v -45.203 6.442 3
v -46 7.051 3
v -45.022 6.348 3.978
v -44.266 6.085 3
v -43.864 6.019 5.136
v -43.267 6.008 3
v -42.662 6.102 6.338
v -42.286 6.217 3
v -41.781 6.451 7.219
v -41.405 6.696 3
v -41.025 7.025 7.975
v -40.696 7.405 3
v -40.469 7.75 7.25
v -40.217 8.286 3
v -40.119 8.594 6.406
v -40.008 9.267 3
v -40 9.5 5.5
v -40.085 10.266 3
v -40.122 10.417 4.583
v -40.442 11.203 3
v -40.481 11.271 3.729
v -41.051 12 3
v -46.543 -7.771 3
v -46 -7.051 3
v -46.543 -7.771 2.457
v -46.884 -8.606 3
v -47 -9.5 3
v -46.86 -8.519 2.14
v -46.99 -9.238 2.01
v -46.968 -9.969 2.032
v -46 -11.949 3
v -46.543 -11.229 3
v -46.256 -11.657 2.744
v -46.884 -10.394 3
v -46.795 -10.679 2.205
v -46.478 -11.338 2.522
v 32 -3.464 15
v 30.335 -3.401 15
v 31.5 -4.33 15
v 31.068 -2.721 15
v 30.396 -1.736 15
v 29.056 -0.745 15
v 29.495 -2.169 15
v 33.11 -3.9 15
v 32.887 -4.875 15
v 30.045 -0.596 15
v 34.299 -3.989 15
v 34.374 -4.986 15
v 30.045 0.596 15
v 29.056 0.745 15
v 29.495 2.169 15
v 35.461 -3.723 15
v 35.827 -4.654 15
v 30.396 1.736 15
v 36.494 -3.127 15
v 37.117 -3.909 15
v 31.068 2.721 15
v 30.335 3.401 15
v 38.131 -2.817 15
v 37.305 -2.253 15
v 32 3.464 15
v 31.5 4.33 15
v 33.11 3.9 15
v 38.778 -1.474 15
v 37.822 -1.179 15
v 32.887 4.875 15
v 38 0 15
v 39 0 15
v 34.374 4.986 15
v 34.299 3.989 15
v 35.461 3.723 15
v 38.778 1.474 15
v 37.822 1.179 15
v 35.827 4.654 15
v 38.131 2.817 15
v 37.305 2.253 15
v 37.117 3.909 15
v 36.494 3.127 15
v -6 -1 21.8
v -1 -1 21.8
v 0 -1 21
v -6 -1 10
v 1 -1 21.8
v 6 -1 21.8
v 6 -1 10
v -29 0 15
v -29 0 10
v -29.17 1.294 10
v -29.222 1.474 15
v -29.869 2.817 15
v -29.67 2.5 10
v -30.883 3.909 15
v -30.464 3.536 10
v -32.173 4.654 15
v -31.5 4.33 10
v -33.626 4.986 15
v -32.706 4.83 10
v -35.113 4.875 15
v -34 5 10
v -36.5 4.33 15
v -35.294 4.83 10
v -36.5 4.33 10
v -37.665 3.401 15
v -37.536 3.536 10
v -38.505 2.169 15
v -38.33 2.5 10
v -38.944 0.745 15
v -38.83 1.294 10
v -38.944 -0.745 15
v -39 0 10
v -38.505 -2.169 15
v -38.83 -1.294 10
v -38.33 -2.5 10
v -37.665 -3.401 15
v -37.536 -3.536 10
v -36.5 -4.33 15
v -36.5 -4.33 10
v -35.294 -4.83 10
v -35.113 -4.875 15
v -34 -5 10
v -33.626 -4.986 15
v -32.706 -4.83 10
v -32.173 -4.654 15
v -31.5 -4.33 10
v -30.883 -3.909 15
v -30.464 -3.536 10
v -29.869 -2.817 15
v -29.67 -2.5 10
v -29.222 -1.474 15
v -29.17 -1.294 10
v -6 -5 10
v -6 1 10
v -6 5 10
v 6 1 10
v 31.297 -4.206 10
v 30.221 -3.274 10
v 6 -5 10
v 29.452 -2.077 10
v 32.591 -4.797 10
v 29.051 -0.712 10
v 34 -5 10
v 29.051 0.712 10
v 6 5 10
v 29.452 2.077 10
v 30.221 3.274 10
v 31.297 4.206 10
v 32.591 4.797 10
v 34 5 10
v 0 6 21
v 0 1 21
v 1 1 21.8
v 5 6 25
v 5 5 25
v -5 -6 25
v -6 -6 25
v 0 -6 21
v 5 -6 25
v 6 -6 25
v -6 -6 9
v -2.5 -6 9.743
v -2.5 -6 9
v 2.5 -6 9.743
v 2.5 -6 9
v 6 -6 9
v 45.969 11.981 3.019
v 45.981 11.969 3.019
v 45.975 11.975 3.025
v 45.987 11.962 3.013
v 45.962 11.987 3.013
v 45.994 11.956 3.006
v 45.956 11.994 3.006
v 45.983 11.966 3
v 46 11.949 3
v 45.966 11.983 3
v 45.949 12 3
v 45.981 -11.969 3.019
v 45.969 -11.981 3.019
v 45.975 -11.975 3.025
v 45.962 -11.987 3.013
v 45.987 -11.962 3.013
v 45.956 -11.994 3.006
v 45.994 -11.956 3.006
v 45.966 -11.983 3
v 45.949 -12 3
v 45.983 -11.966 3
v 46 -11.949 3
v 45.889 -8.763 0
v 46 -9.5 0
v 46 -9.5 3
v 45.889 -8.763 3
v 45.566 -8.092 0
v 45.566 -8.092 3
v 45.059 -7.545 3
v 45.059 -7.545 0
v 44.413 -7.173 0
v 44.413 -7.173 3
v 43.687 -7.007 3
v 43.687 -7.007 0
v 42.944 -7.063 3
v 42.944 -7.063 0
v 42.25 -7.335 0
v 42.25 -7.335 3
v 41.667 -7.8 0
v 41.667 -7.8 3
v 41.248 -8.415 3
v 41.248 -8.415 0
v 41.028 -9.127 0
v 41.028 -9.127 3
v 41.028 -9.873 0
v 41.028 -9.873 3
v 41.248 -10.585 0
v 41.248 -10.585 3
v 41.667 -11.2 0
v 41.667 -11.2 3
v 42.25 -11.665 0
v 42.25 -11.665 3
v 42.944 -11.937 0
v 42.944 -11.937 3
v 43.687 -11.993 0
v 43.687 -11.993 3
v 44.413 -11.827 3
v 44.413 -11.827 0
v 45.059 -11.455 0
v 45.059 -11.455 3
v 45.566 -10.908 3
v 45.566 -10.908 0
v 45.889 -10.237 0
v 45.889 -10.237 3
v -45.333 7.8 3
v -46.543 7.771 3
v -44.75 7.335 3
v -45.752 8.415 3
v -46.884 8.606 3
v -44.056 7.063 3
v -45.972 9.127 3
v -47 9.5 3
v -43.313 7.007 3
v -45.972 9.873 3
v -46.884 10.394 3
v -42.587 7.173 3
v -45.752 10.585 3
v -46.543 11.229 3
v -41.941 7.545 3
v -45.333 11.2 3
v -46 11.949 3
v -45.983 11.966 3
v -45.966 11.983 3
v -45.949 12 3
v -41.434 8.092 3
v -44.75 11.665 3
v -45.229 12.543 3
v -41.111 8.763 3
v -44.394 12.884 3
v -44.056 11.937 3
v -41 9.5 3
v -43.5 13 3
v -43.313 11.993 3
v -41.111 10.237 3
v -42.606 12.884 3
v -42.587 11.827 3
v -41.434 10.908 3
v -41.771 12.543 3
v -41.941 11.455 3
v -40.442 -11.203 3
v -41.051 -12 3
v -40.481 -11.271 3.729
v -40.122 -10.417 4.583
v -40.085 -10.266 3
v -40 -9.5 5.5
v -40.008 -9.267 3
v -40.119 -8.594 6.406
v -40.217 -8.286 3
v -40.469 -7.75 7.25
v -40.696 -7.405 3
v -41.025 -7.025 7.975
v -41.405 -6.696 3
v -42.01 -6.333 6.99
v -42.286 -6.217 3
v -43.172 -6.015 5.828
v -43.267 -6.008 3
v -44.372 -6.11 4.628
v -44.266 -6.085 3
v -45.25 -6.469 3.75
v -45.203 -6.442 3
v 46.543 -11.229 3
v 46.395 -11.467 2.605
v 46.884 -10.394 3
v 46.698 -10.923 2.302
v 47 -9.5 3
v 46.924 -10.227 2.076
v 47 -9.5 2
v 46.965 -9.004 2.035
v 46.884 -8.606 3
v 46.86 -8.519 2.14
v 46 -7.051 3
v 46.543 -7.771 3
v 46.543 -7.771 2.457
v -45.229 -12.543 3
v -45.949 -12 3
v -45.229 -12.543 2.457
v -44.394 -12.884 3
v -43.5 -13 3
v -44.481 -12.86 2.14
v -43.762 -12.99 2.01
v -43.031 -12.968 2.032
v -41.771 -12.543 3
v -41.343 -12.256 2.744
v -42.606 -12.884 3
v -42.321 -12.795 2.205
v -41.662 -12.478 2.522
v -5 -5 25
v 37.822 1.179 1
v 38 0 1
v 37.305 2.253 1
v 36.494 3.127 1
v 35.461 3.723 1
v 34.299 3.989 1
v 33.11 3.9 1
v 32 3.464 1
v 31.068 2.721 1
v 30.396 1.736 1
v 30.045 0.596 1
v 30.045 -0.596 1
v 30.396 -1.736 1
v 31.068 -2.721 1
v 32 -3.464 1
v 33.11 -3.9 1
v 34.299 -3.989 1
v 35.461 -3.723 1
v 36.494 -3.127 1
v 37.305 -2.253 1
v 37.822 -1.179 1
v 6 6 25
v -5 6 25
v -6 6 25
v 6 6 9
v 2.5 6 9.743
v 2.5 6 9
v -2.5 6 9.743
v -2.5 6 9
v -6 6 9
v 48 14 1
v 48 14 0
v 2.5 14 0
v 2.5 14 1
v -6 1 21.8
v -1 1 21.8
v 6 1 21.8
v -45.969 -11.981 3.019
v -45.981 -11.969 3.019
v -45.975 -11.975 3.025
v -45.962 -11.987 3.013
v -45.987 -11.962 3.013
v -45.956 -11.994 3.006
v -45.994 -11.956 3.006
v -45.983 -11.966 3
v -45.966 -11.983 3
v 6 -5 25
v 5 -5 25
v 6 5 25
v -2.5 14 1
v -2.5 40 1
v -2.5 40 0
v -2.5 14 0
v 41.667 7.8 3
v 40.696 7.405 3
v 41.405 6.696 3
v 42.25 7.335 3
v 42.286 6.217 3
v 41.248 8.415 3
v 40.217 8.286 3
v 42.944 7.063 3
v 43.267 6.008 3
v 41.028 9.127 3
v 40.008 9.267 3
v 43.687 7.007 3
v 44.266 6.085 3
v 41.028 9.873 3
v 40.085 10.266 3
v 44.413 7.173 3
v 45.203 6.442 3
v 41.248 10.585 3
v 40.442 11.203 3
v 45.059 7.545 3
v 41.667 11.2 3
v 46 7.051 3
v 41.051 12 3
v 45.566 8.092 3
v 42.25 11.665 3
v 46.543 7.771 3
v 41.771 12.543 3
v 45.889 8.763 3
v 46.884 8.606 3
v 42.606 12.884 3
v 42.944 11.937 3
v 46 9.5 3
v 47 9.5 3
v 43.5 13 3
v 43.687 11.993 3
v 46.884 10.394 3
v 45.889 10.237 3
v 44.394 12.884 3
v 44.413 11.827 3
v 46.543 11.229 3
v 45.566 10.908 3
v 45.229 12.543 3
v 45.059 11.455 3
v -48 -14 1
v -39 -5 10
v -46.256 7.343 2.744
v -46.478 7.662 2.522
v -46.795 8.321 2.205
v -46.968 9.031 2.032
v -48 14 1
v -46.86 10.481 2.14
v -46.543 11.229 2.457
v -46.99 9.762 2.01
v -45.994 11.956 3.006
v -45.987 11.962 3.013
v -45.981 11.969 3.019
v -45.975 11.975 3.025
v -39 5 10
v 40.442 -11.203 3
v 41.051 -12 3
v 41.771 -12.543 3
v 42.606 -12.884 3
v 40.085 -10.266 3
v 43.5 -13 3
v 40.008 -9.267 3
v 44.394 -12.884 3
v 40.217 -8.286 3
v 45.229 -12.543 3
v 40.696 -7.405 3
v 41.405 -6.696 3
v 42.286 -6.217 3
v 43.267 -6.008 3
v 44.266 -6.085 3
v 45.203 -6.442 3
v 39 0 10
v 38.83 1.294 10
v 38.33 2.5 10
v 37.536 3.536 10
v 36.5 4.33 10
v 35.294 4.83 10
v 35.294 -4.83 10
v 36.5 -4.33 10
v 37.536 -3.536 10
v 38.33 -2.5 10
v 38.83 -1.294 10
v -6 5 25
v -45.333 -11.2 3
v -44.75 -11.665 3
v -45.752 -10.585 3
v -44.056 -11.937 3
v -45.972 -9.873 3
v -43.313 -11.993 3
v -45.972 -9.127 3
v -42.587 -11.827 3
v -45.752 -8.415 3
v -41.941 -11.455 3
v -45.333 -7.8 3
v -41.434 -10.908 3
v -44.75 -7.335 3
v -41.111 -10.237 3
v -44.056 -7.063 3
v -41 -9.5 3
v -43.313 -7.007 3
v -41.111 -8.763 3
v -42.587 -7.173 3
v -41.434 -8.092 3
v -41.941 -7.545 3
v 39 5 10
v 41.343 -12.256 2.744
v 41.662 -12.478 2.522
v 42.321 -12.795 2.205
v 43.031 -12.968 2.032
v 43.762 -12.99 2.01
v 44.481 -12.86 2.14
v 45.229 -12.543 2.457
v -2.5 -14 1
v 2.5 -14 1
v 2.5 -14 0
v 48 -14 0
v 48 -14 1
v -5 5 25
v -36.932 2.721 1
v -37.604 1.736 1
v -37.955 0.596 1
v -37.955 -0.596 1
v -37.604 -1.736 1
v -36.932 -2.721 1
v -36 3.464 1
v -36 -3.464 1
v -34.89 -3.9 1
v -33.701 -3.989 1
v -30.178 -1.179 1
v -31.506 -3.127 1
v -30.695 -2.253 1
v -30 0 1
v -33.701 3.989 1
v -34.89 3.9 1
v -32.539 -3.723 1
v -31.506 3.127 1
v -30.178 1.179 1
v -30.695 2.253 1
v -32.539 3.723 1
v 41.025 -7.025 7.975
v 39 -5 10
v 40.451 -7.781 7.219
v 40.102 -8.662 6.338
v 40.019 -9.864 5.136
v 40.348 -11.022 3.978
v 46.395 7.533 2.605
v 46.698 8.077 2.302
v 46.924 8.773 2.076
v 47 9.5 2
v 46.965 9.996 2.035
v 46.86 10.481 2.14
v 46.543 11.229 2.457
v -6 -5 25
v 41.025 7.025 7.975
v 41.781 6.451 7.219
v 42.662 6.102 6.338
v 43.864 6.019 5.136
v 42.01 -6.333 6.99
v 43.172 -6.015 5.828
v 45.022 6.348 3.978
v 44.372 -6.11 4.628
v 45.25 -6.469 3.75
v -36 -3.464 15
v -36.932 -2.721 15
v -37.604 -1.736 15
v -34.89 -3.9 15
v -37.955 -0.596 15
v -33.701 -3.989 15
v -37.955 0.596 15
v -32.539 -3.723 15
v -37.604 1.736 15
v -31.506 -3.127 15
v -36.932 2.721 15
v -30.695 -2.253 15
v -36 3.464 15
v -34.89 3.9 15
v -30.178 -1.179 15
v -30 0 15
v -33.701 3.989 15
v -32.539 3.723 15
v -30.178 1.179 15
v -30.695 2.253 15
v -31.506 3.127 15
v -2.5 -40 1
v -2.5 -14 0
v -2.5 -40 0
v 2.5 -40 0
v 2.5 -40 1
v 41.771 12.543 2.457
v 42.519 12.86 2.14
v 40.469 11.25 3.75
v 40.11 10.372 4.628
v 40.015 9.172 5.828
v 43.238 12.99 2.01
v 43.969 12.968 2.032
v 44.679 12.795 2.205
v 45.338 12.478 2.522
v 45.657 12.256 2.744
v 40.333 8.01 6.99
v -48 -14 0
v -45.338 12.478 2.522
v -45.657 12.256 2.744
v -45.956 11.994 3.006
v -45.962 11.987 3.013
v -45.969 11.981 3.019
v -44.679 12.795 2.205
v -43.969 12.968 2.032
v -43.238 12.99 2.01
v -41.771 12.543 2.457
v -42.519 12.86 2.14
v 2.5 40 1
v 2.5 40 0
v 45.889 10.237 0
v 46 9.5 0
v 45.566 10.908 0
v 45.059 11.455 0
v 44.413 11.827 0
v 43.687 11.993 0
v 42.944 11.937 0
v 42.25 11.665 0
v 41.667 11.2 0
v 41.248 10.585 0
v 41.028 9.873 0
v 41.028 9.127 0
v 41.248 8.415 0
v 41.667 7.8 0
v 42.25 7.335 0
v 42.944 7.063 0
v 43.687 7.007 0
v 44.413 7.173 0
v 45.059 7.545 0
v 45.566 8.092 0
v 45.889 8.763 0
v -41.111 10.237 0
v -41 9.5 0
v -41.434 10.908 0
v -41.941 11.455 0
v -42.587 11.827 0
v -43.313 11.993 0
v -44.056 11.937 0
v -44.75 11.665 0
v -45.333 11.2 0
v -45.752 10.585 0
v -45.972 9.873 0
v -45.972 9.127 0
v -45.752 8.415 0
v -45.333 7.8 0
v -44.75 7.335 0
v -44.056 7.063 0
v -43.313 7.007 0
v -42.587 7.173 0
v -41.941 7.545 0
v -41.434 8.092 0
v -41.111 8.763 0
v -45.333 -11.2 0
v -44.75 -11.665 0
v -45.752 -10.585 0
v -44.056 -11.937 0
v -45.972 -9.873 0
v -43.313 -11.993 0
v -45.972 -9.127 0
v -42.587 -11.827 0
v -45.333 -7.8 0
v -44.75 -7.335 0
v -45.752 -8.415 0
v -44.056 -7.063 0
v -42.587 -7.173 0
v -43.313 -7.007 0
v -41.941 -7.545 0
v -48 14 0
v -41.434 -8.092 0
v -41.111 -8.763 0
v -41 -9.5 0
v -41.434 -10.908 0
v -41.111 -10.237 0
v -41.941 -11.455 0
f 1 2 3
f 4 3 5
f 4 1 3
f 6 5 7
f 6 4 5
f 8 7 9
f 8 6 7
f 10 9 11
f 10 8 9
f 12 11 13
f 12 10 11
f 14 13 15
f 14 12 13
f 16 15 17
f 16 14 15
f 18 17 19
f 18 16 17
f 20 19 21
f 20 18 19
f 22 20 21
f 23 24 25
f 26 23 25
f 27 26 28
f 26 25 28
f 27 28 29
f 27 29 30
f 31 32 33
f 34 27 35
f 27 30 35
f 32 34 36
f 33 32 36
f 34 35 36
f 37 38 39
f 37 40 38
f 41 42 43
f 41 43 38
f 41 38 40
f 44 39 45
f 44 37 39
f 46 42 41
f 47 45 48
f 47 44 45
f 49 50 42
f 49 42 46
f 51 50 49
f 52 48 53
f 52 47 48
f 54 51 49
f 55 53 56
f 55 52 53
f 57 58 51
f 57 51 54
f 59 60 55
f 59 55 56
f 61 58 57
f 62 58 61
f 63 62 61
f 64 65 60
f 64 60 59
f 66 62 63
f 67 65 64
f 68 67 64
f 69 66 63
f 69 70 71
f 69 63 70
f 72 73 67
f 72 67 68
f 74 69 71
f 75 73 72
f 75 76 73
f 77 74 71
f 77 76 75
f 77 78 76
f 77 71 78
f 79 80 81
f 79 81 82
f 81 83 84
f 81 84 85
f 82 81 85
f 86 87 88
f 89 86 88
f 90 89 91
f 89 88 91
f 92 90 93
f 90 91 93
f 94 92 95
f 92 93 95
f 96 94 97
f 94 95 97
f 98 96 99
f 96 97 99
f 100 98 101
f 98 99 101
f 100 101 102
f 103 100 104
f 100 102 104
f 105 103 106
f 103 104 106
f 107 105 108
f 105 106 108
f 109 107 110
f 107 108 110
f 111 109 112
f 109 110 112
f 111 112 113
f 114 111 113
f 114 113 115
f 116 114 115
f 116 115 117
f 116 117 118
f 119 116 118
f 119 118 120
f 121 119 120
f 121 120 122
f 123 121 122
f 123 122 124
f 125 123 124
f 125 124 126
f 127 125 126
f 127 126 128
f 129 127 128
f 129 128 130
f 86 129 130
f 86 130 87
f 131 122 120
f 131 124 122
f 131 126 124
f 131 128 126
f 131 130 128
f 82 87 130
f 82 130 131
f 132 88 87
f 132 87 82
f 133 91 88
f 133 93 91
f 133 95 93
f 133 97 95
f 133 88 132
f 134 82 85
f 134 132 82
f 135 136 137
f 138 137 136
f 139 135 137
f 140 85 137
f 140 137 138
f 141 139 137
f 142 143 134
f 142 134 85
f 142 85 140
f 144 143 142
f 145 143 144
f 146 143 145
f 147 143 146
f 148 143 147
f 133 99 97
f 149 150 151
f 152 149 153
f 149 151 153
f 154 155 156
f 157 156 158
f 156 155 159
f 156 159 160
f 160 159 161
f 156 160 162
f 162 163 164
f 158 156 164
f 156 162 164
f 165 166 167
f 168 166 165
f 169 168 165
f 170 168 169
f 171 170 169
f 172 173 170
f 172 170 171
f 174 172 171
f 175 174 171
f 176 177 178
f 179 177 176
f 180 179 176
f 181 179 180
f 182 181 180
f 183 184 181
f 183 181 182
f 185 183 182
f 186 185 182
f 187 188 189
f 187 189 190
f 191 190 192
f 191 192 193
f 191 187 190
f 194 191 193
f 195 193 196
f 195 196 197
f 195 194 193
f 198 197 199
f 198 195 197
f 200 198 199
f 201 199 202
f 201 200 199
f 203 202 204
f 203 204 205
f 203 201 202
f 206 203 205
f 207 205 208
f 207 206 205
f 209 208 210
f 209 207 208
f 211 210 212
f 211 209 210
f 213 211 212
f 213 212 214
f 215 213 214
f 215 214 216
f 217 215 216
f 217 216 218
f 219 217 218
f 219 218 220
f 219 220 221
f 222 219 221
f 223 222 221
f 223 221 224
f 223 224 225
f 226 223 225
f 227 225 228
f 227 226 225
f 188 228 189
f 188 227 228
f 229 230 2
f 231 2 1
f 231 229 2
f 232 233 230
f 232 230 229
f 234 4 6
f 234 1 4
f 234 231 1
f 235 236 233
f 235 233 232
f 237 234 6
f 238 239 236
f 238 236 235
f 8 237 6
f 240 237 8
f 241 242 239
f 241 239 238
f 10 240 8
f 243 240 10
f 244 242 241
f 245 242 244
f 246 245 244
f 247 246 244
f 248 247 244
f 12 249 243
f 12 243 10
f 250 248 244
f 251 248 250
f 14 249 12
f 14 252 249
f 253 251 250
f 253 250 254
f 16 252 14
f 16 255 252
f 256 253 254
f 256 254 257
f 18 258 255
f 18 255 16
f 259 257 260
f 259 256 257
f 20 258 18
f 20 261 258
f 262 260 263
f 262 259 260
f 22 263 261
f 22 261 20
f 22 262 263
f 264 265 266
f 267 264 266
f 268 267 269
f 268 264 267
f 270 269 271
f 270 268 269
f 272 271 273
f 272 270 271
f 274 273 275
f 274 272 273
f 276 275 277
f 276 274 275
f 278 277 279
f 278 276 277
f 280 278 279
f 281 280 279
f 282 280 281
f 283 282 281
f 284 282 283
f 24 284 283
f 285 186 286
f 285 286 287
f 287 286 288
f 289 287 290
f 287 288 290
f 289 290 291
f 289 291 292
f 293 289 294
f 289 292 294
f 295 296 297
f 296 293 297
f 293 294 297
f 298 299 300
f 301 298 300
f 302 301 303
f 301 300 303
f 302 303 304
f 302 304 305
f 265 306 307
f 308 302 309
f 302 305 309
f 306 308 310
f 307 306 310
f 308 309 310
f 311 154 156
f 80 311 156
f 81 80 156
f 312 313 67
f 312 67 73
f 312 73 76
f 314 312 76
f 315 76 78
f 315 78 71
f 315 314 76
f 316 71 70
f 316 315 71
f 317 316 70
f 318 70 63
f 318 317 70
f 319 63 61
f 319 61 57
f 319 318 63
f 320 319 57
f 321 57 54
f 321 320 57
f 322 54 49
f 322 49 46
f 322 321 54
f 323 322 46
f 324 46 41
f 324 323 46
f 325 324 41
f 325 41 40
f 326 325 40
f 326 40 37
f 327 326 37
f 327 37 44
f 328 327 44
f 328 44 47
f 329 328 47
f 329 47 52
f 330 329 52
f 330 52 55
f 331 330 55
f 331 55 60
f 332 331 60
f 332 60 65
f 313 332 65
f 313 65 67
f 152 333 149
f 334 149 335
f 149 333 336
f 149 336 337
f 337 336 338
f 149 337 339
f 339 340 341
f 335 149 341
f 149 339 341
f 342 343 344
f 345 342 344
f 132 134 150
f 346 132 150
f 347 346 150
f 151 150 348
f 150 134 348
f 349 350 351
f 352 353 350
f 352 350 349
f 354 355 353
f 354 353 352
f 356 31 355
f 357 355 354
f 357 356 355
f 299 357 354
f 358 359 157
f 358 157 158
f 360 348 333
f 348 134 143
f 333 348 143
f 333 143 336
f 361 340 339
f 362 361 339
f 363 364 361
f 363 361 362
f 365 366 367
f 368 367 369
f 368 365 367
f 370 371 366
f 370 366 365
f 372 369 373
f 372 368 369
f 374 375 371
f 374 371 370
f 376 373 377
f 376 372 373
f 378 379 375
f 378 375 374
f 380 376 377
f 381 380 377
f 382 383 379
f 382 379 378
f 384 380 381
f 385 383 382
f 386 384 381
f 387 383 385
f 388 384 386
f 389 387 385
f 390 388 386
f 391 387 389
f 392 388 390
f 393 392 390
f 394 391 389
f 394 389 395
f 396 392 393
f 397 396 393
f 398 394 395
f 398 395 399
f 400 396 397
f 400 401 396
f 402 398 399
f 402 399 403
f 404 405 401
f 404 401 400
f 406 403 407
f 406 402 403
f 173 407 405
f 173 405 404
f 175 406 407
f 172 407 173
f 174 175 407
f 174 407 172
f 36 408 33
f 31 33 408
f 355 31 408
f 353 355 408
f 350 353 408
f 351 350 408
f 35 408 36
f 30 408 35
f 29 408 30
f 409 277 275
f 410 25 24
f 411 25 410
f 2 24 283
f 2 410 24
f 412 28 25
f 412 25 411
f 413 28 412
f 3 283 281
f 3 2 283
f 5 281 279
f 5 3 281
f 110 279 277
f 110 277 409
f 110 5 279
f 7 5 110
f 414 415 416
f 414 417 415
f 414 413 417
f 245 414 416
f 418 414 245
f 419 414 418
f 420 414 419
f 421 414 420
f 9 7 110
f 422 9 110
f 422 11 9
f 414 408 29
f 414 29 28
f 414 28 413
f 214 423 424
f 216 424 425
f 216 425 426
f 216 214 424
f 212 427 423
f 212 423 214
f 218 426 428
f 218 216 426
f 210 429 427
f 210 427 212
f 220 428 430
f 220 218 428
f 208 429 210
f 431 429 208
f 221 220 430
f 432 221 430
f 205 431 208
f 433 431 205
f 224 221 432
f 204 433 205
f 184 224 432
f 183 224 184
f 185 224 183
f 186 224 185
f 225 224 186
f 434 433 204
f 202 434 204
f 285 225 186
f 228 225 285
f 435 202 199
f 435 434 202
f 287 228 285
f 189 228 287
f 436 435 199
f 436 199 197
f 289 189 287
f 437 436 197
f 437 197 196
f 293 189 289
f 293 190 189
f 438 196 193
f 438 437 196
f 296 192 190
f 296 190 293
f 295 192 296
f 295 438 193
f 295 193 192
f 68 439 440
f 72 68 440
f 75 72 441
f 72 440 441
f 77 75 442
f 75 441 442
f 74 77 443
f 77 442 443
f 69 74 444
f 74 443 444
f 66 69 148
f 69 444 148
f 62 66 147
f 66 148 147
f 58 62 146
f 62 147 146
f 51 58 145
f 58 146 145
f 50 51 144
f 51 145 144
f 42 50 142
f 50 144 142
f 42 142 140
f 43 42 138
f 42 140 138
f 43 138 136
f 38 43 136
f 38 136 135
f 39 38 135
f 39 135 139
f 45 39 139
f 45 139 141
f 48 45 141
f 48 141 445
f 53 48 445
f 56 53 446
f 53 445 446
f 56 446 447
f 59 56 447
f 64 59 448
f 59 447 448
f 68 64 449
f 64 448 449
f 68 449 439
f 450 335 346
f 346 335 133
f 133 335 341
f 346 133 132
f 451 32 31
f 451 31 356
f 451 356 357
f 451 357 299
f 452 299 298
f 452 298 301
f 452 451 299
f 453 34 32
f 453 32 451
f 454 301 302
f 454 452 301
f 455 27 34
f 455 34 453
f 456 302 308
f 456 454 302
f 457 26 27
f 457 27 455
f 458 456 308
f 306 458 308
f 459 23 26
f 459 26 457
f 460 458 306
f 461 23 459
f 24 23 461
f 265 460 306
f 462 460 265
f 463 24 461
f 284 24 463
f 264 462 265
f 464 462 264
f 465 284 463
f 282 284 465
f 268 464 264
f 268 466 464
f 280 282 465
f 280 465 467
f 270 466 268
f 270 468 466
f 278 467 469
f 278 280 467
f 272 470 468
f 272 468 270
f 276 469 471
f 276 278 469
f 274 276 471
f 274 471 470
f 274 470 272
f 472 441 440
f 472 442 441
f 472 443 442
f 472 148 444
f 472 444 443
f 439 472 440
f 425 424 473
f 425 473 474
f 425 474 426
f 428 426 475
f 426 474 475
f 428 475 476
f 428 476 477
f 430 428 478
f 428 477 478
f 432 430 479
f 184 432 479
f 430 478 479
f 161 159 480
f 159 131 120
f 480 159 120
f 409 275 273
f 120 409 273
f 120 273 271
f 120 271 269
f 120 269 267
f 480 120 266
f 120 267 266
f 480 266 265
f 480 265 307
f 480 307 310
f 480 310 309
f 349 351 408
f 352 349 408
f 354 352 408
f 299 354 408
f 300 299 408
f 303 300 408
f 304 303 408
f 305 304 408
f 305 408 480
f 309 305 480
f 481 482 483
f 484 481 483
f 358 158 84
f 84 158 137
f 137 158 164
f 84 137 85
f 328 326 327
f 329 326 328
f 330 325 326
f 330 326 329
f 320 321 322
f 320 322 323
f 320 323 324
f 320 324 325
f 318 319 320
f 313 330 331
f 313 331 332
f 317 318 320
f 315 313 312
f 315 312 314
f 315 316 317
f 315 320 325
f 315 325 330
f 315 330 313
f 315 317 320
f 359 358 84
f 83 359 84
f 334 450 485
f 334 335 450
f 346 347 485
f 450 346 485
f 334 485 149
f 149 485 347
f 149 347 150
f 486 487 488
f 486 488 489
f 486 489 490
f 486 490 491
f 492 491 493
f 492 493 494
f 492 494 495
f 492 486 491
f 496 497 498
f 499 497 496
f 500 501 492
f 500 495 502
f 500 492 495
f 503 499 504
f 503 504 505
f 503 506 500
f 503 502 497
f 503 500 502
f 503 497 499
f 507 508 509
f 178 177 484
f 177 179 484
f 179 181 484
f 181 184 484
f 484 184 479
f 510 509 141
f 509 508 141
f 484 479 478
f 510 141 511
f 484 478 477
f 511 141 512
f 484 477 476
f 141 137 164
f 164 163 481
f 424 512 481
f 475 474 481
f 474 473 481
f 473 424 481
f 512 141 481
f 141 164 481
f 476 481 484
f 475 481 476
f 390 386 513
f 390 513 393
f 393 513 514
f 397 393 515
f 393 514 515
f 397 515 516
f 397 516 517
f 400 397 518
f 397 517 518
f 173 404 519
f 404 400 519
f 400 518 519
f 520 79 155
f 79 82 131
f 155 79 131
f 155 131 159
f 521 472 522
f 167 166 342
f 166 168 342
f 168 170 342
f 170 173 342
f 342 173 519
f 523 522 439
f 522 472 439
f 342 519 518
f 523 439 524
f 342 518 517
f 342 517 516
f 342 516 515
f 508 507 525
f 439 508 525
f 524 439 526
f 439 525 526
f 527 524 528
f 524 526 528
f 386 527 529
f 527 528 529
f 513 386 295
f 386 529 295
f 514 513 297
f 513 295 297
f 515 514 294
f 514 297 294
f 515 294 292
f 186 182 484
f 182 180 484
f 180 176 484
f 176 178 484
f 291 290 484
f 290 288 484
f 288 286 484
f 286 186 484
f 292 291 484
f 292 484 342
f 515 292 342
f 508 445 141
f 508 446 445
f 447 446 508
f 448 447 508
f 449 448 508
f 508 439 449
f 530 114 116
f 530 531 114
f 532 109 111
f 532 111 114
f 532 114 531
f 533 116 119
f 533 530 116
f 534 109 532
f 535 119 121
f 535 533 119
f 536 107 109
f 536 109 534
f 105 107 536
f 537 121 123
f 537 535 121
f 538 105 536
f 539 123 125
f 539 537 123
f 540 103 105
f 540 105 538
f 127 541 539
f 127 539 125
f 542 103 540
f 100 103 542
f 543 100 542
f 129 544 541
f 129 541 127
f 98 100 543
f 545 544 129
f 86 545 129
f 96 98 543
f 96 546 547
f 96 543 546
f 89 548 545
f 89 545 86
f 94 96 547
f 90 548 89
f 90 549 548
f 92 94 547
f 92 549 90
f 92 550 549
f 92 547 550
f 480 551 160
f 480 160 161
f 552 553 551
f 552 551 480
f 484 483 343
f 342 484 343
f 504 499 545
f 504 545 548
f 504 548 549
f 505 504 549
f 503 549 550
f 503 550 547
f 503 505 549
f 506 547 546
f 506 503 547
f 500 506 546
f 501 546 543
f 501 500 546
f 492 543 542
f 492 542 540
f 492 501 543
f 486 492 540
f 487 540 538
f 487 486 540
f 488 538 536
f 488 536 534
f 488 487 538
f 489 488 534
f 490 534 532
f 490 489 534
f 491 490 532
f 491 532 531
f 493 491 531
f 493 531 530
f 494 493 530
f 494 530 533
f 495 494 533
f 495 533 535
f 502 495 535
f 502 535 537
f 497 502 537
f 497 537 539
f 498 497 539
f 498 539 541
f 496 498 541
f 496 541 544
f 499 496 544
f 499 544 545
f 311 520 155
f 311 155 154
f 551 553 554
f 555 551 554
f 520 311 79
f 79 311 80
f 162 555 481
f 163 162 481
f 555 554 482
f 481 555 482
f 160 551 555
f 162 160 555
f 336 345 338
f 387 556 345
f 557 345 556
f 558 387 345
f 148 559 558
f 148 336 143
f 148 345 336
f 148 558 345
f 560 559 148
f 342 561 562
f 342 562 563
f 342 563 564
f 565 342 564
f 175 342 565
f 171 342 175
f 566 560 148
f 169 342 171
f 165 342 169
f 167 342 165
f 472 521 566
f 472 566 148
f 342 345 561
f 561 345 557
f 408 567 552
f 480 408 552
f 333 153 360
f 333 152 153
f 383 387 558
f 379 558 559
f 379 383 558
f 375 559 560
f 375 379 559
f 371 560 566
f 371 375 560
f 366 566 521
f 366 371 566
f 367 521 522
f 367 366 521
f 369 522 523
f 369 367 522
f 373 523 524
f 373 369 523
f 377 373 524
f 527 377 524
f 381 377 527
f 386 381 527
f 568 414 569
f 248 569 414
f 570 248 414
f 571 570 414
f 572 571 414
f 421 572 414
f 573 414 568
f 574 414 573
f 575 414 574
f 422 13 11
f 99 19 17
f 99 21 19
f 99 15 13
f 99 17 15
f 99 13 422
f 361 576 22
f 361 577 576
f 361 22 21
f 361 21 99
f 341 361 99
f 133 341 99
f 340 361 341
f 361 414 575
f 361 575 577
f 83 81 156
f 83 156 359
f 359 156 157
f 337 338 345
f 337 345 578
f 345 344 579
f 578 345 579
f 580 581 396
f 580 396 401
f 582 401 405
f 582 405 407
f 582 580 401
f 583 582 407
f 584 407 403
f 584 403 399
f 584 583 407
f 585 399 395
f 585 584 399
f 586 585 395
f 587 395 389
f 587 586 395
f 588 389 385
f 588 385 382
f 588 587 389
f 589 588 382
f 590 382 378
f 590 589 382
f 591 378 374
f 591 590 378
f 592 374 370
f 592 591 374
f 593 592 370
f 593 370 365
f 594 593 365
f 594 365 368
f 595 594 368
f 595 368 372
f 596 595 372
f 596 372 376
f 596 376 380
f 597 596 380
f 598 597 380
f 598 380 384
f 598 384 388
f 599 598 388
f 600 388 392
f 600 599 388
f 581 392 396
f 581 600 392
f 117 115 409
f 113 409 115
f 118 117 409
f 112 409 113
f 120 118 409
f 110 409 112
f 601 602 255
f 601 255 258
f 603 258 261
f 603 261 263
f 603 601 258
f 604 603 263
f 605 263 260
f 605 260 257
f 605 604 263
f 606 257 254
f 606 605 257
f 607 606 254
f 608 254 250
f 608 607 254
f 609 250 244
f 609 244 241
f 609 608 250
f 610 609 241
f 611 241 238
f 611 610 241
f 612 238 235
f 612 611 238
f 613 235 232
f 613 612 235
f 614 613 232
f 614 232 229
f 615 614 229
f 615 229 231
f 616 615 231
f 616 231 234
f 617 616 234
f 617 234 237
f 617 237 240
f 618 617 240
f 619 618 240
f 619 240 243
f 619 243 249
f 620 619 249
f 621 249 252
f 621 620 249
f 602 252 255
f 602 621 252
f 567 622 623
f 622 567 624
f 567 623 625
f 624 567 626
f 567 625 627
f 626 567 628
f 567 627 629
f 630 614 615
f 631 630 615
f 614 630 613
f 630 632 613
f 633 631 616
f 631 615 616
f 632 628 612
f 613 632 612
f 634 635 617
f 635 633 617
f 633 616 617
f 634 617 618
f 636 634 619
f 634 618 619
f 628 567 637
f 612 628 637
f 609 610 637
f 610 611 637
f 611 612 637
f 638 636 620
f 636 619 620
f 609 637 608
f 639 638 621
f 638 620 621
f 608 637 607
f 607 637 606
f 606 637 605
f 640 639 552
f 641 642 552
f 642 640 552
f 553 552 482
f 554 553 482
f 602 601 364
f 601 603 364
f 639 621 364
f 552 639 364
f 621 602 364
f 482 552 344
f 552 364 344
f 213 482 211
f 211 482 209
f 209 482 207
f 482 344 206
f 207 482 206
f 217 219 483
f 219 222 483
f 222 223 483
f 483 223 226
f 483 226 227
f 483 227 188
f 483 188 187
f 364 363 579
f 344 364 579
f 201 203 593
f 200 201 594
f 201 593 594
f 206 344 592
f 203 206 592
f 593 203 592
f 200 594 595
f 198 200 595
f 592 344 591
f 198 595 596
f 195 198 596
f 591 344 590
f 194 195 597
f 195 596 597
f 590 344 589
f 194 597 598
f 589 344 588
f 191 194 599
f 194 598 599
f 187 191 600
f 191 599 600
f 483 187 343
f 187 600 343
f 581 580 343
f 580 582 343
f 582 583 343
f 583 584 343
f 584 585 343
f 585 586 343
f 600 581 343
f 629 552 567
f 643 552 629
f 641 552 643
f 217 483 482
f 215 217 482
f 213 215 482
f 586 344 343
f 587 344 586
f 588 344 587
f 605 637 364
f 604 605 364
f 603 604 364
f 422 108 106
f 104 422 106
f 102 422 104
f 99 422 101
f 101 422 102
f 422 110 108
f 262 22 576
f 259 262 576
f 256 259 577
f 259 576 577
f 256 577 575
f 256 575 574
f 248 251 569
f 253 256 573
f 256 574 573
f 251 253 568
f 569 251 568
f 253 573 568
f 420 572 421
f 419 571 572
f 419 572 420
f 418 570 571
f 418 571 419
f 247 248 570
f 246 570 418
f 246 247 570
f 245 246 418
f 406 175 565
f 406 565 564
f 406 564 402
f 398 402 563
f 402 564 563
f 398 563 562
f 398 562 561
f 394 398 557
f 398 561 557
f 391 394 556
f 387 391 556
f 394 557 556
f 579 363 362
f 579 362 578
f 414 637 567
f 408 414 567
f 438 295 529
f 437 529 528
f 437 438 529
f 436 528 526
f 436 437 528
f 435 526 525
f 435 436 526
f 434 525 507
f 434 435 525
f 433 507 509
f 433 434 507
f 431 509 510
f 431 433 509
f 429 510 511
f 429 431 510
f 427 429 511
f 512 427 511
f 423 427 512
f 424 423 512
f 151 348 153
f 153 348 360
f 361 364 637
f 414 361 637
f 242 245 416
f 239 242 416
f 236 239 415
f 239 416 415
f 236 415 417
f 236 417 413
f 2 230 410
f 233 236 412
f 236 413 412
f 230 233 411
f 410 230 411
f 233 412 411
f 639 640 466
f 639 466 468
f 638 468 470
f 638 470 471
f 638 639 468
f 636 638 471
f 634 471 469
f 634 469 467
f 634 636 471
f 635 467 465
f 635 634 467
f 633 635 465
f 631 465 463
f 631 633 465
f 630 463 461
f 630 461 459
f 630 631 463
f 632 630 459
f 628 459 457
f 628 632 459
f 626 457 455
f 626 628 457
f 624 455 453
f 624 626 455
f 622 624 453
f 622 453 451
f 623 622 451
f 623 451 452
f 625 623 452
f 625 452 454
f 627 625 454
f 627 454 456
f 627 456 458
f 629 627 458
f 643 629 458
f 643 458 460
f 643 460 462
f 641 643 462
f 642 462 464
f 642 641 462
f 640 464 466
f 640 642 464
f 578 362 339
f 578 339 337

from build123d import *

# Parameters (mm, degrees)
F0_R         = 3.5
F0_R_2       = 5
F0_W         = 5
F0_H         = 26
F0_W_2       = 2.5
F0_H_2       = 6
F0_W_3       = 3.5
F1_DEPTH     = 10
F0_R_3       = 4
F2_DEPTH     = 15
F3_DEPTH     = 1
F4_T4_DEPTH  = 74.2902937834
F4_S5_R      = 5
F4_T6_DEPTH  = 39
F4_T10_DEPTH = 74.2902937834
F4_S11_R     = 5
F4_T12_DEPTH = 39
F4_T16_DEPTH = 91.7902937834
F4_T21_DEPTH = 68.6451468917
F4_S22_R     = 5
F4_T23_DEPTH = 36
F4_T27_DEPTH = 68.6451468917
F4_S28_R     = 5
F4_T29_DEPTH = 36
F4_T33_DEPTH = 91.7902937834
F4_T38_DEPTH = 91.7902937834
F4_T43_DEPTH = 68.6451468917
F4_S44_R     = 5
F4_T45_DEPTH = 36
F4_T49_DEPTH = 68.6451468917
F4_S50_R     = 5
F4_T51_DEPTH = 36
F4_T55_DEPTH = 91.7902937834
F5_SIZE2     = 9
F5_SIZE      = 35
F0_R_4       = 2.5
F6_DEPTH     = 3
F7_DEPTH     = 25
F8_W         = 2
F8_H         = 7
F10_DEPTH    = 25
F11_DEPTH    = 25


# Not quite as in the source:
# - a fillet or chamfer that OpenCascade refuses, or shapes differently, is made with other operations: its cross-section is extruded or revolved along the edge and cut away or added


with BuildPart() as f1:
    # F0 (on Top) → F1 (new body)
    with BuildSketch(Plane.XY):
        Polygon((-2.5, 14), (-48, 14), (-48, -14), (-2.5, -14), (-2.5, -6), (-6, -6), (-6, 0), (-6, 6), (-2.5, 6), align=None)
        with Locations((-43.5, -9.5)):
            Circle(F0_R, mode=Mode.SUBTRACT)
        with Locations((-43.5, 9.5)):
            Circle(F0_R, mode=Mode.SUBTRACT)
        with Locations((-34, 0)):
            Circle(F0_R_2, mode=Mode.SUBTRACT)
        Polygon((48, 14), (2.5, 14), (2.5, 6), (6, 6), (6, 0), (6, -6), (2.5, -6), (2.5, -14), (48, -14), align=None)
        with Locations((43.5, -9.5)):
            Circle(F0_R, mode=Mode.SUBTRACT)
        with Locations((34, 0)):
            Circle(F0_R_2, mode=Mode.SUBTRACT)
        with Locations((43.5, 9.5)):
            Circle(F0_R, mode=Mode.SUBTRACT)
        Polygon((-2.5, -6), (-2.5, -14), (2.5, -14), (2.5, -6), (0, -6), align=None)
        with Locations((0, -27)):
            Rectangle(F0_W, F0_H)
        Polygon((2.5, 14), (-2.5, 14), (-2.5, 6), (0, 6), (2.5, 6), align=None)
        with Locations((0, 27)):
            Rectangle(F0_W, F0_H)
        with Locations((1.25, -3)):
            Rectangle(F0_W_2, F0_H_2)
        with Locations((4.25, -3)):
            Rectangle(F0_W_3, F0_H_2)
        with Locations((-4.25, -3)):
            Rectangle(F0_W_3, F0_H_2)
        with Locations((-1.25, -3)):
            Rectangle(F0_W_2, F0_H_2)
        with Locations((-1.25, 3)):
            Rectangle(F0_W_2, F0_H_2)
        with Locations((-4.25, 3)):
            Rectangle(F0_W_3, F0_H_2)
        with Locations((4.25, 3)):
            Rectangle(F0_W_3, F0_H_2)
        with Locations((1.25, 3)):
            Rectangle(F0_W_2, F0_H_2)
    extrude(amount=F1_DEPTH)

    # F0 (on Top) → F2 (join)
    with BuildSketch(Plane.XY):
        with Locations((-34, 0)):
            Circle(F0_R_2)
        with Locations((-34, 0)):
            Circle(F0_R_3, mode=Mode.SUBTRACT)
        with Locations((34, 0)):
            Circle(F0_R_2)
        with Locations((34, 0)):
            Circle(F0_R_3, mode=Mode.SUBTRACT)
    extrude(amount=F2_DEPTH)

    # F0 (on Top) → F3 (join)
    with BuildSketch(Plane.XY):
        with Locations((-34, 0)):
            Circle(F0_R_3)
        with Locations((34, 0)):
            Circle(F0_R_3)
    extrude(amount=F3_DEPTH)

    # F4: chamfer of 9 on 6 edges, made by hand


with BuildPart() as f4_tool2:
    # F4_s3 → F4_t4 (new body)
    with BuildSketch(Plane.XZ.offset(37.1451468917)):
        Polygon((39, 10), (48, 1), (48, 10), align=None)
    extrude(amount=-F4_T4_DEPTH)

    # F4_s5 → F4_t6 (cut, symmetric)
    with BuildSketch(Plane.XY.offset(5.5)):
        with Locations((34, 0)):
            Circle(F4_S5_R)
    extrude(amount=F4_T6_DEPTH, both=True, mode=Mode.SUBTRACT)


with BuildPart() as f1_1:
    add(f1.part)

    # F4_t1: cut F4_tool2
    add(f4_tool2.part, mode=Mode.SUBTRACT)


with BuildPart() as f4_tool8:
    # F4_s9 → F4_t10 (new body)
    with BuildSketch(Plane.XZ.offset(-37.1451468917)):
        Polygon((-48, 1), (-39, 10), (-48, 10), align=None)
    extrude(amount=F4_T10_DEPTH)

    # F4_s11 → F4_t12 (cut, symmetric)
    with BuildSketch(Plane.XY.offset(5.5)):
        with Locations((-34, 0)):
            Circle(F4_S11_R)
    extrude(amount=F4_T12_DEPTH, both=True, mode=Mode.SUBTRACT)


with BuildPart() as f1_2:
    add(f1_1.part)

    # F4_t7: cut F4_tool8
    add(f4_tool8.part, mode=Mode.SUBTRACT)


with BuildPart() as f4_tool14:
    # F4_s15 → F4_t16 (new body)
    with BuildSketch(Plane.YZ.offset(20.6451468917)):
        Polygon((14, 1), (5, 10), (14, 10), align=None)
    extrude(amount=-F4_T16_DEPTH)

    split(bisect_by=Plane.YZ.offset(2.5), keep=Keep.TOP)


with BuildPart() as f1_3:
    add(f1_2.part)

    # F4_t13: cut F4_tool14
    add(f4_tool14.part, mode=Mode.SUBTRACT)


with BuildPart() as f4_tool19:
    # F4_s20 → F4_t21 (new body)
    with BuildSketch(Plane.YZ.offset(-2.5)):
        Polygon((14, 1), (5, 10), (14, 10), align=None)
    extrude(amount=-F4_T21_DEPTH)

    # F4_s22 → F4_t23 (cut, symmetric)
    with BuildSketch(Plane.XY.offset(5.5)):
        with Locations((-34, 0)):
            Circle(F4_S22_R)
    extrude(amount=F4_T23_DEPTH, both=True, mode=Mode.SUBTRACT)


with BuildPart() as f1_4:
    add(f1_3.part)

    # F4_t18: cut F4_tool19
    add(f4_tool19.part, mode=Mode.SUBTRACT)


with BuildPart() as f4_tool25:
    # F4_s26 → F4_t27 (new body)
    with BuildSketch(Plane.YZ.offset(71.1451468917)):
        Polygon((5, 10), (14, 1), (14, 10), align=None)
    extrude(amount=-F4_T27_DEPTH)

    # F4_s28 → F4_t29 (cut, symmetric)
    with BuildSketch(Plane.XY.offset(5.5)):
        with Locations((34, 0)):
            Circle(F4_S28_R)
    extrude(amount=F4_T29_DEPTH, both=True, mode=Mode.SUBTRACT)


with BuildPart() as f1_5:
    add(f1_4.part)

    # F4_t24: cut F4_tool25
    add(f4_tool25.part, mode=Mode.SUBTRACT)


with BuildPart() as f4_tool31:
    # F4_s32 → F4_t33 (new body)
    with BuildSketch(Plane.YZ.offset(71.1451468917)):
        Polygon((5, 10), (14, 1), (14, 10), align=None)
    extrude(amount=-F4_T33_DEPTH)

    split(bisect_by=Plane.YZ.offset(-2.5), keep=Keep.BOTTOM)


with BuildPart() as f1_6:
    add(f1_5.part)

    # F4_t30: cut F4_tool31
    add(f4_tool31.part, mode=Mode.SUBTRACT)


with BuildPart() as f4_tool36:
    # F4_s37 → F4_t38 (new body)
    with BuildSketch(Plane.YZ.offset(-20.6451468917)):
        Polygon((-5, 10), (-14, 1), (-14, 10), align=None)
    extrude(amount=F4_T38_DEPTH)

    split(bisect_by=Plane.YZ.offset(-2.5), keep=Keep.BOTTOM)


with BuildPart() as f1_7:
    add(f1_6.part)

    # F4_t35: cut F4_tool36
    add(f4_tool36.part, mode=Mode.SUBTRACT)


with BuildPart() as f4_tool41:
    # F4_s42 → F4_t43 (new body)
    with BuildSketch(Plane.YZ.offset(2.5)):
        Polygon((-5, 10), (-14, 1), (-14, 10), align=None)
    extrude(amount=F4_T43_DEPTH)

    # F4_s44 → F4_t45 (cut, symmetric)
    with BuildSketch(Plane.XY.offset(5.5)):
        with Locations((34, 0)):
            Circle(F4_S44_R)
    extrude(amount=F4_T45_DEPTH, both=True, mode=Mode.SUBTRACT)


with BuildPart() as f1_8:
    add(f1_7.part)

    # F4_t40: cut F4_tool41
    add(f4_tool41.part, mode=Mode.SUBTRACT)


with BuildPart() as f4_tool47:
    # F4_s48 → F4_t49 (new body)
    with BuildSketch(Plane.YZ.offset(-71.1451468917)):
        Polygon((-14, 1), (-5, 10), (-14, 10), align=None)
    extrude(amount=F4_T49_DEPTH)

    # F4_s50 → F4_t51 (cut, symmetric)
    with BuildSketch(Plane.XY.offset(5.5)):
        with Locations((-34, 0)):
            Circle(F4_S50_R)
    extrude(amount=F4_T51_DEPTH, both=True, mode=Mode.SUBTRACT)


with BuildPart() as f1_9:
    add(f1_8.part)

    # F4_t46: cut F4_tool47
    add(f4_tool47.part, mode=Mode.SUBTRACT)


with BuildPart() as f4_tool53:
    # F4_s54 → F4_t55 (new body)
    with BuildSketch(Plane.YZ.offset(-71.1451468917)):
        Polygon((-14, 1), (-5, 10), (-14, 10), align=None)
    extrude(amount=F4_T55_DEPTH)

    split(bisect_by=Plane.YZ.offset(2.5), keep=Keep.TOP)


with BuildPart() as f1_10:
    add(f1_9.part)

    # F4_t52: cut F4_tool53
    add(f4_tool53.part, mode=Mode.SUBTRACT)

    # F5
    f5_edges = [f1_10.edges().sort_by_distance(p)[0] for p in [
        (0, 40, 10),
        (0, -40, 10),
    ]]
    f5_side = f1_10.faces().sort_by_distance((0, 0, 10))[0]
    chamfer(f5_edges, length=F5_SIZE, length2=F5_SIZE2, reference=f5_side)

    # F0 (on Top) → F6 (join)
    with BuildSketch(Plane.XY):
        with Locations((-43.5, -9.5)):
            Circle(F0_R)
        with Locations((-43.5, -9.5)):
            Circle(F0_R_4, mode=Mode.SUBTRACT)
        with Locations((-43.5, 9.5)):
            Circle(F0_R)
        with Locations((-43.5, 9.5)):
            Circle(F0_R_4, mode=Mode.SUBTRACT)
        with Locations((43.5, 9.5)):
            Circle(F0_R)
        with Locations((43.5, 9.5)):
            Circle(F0_R_4, mode=Mode.SUBTRACT)
        with Locations((43.5, -9.5)):
            Circle(F0_R)
        with Locations((43.5, -9.5)):
            Circle(F0_R_4, mode=Mode.SUBTRACT)
    extrude(amount=F6_DEPTH)

    # F0 (on Top) → F7 (join)
    with BuildSketch(Plane.XY):
        with Locations((4.25, -3)):
            Rectangle(F0_W_3, F0_H_2)
        with Locations((1.25, -3)):
            Rectangle(F0_W_2, F0_H_2)
        with Locations((-1.25, -3)):
            Rectangle(F0_W_2, F0_H_2)
        with Locations((-4.25, -3)):
            Rectangle(F0_W_3, F0_H_2)
        with Locations((-4.25, 3)):
            Rectangle(F0_W_3, F0_H_2)
        with Locations((-1.25, 3)):
            Rectangle(F0_W_2, F0_H_2)
        with Locations((4.25, 3)):
            Rectangle(F0_W_3, F0_H_2)
        with Locations((1.25, 3)):
            Rectangle(F0_W_2, F0_H_2)
    extrude(amount=F7_DEPTH)

    # F8 (on face) → F10 (cut)
    with BuildSketch(Plane.YZ.offset(6)):
        Polygon((-1, 25), (-5, 25), (-1, 21.8), align=None)
        Polygon((-1, 25), (-1, 21.8), (0, 21), (1, 21.8), (1, 25), align=None)
        Polygon((5, 25), (1, 25), (1, 21.8), align=None)
        Polygon((0, 21), (-1, 21.8), (-1, 17), (1, 17), (1, 21.8), align=None)
        with Locations((0, 13.5)):
            Rectangle(F8_W, F8_H)
    extrude(amount=-F10_DEPTH, mode=Mode.SUBTRACT)

    # F9 (on face) → F11 (cut)
    with BuildSketch(Plane.XZ.offset(6)):
        Polygon((-1, 25), (-1, 21.8), (0, 21), (1, 21.8), (1, 25), align=None)
        Polygon((-1, 25), (-5, 25), (-1, 21.8), align=None)
        Polygon((5, 25), (1, 25), (1, 21.8), align=None)
    extrude(amount=-F11_DEPTH, mode=Mode.SUBTRACT)


solid = f1_10.part
